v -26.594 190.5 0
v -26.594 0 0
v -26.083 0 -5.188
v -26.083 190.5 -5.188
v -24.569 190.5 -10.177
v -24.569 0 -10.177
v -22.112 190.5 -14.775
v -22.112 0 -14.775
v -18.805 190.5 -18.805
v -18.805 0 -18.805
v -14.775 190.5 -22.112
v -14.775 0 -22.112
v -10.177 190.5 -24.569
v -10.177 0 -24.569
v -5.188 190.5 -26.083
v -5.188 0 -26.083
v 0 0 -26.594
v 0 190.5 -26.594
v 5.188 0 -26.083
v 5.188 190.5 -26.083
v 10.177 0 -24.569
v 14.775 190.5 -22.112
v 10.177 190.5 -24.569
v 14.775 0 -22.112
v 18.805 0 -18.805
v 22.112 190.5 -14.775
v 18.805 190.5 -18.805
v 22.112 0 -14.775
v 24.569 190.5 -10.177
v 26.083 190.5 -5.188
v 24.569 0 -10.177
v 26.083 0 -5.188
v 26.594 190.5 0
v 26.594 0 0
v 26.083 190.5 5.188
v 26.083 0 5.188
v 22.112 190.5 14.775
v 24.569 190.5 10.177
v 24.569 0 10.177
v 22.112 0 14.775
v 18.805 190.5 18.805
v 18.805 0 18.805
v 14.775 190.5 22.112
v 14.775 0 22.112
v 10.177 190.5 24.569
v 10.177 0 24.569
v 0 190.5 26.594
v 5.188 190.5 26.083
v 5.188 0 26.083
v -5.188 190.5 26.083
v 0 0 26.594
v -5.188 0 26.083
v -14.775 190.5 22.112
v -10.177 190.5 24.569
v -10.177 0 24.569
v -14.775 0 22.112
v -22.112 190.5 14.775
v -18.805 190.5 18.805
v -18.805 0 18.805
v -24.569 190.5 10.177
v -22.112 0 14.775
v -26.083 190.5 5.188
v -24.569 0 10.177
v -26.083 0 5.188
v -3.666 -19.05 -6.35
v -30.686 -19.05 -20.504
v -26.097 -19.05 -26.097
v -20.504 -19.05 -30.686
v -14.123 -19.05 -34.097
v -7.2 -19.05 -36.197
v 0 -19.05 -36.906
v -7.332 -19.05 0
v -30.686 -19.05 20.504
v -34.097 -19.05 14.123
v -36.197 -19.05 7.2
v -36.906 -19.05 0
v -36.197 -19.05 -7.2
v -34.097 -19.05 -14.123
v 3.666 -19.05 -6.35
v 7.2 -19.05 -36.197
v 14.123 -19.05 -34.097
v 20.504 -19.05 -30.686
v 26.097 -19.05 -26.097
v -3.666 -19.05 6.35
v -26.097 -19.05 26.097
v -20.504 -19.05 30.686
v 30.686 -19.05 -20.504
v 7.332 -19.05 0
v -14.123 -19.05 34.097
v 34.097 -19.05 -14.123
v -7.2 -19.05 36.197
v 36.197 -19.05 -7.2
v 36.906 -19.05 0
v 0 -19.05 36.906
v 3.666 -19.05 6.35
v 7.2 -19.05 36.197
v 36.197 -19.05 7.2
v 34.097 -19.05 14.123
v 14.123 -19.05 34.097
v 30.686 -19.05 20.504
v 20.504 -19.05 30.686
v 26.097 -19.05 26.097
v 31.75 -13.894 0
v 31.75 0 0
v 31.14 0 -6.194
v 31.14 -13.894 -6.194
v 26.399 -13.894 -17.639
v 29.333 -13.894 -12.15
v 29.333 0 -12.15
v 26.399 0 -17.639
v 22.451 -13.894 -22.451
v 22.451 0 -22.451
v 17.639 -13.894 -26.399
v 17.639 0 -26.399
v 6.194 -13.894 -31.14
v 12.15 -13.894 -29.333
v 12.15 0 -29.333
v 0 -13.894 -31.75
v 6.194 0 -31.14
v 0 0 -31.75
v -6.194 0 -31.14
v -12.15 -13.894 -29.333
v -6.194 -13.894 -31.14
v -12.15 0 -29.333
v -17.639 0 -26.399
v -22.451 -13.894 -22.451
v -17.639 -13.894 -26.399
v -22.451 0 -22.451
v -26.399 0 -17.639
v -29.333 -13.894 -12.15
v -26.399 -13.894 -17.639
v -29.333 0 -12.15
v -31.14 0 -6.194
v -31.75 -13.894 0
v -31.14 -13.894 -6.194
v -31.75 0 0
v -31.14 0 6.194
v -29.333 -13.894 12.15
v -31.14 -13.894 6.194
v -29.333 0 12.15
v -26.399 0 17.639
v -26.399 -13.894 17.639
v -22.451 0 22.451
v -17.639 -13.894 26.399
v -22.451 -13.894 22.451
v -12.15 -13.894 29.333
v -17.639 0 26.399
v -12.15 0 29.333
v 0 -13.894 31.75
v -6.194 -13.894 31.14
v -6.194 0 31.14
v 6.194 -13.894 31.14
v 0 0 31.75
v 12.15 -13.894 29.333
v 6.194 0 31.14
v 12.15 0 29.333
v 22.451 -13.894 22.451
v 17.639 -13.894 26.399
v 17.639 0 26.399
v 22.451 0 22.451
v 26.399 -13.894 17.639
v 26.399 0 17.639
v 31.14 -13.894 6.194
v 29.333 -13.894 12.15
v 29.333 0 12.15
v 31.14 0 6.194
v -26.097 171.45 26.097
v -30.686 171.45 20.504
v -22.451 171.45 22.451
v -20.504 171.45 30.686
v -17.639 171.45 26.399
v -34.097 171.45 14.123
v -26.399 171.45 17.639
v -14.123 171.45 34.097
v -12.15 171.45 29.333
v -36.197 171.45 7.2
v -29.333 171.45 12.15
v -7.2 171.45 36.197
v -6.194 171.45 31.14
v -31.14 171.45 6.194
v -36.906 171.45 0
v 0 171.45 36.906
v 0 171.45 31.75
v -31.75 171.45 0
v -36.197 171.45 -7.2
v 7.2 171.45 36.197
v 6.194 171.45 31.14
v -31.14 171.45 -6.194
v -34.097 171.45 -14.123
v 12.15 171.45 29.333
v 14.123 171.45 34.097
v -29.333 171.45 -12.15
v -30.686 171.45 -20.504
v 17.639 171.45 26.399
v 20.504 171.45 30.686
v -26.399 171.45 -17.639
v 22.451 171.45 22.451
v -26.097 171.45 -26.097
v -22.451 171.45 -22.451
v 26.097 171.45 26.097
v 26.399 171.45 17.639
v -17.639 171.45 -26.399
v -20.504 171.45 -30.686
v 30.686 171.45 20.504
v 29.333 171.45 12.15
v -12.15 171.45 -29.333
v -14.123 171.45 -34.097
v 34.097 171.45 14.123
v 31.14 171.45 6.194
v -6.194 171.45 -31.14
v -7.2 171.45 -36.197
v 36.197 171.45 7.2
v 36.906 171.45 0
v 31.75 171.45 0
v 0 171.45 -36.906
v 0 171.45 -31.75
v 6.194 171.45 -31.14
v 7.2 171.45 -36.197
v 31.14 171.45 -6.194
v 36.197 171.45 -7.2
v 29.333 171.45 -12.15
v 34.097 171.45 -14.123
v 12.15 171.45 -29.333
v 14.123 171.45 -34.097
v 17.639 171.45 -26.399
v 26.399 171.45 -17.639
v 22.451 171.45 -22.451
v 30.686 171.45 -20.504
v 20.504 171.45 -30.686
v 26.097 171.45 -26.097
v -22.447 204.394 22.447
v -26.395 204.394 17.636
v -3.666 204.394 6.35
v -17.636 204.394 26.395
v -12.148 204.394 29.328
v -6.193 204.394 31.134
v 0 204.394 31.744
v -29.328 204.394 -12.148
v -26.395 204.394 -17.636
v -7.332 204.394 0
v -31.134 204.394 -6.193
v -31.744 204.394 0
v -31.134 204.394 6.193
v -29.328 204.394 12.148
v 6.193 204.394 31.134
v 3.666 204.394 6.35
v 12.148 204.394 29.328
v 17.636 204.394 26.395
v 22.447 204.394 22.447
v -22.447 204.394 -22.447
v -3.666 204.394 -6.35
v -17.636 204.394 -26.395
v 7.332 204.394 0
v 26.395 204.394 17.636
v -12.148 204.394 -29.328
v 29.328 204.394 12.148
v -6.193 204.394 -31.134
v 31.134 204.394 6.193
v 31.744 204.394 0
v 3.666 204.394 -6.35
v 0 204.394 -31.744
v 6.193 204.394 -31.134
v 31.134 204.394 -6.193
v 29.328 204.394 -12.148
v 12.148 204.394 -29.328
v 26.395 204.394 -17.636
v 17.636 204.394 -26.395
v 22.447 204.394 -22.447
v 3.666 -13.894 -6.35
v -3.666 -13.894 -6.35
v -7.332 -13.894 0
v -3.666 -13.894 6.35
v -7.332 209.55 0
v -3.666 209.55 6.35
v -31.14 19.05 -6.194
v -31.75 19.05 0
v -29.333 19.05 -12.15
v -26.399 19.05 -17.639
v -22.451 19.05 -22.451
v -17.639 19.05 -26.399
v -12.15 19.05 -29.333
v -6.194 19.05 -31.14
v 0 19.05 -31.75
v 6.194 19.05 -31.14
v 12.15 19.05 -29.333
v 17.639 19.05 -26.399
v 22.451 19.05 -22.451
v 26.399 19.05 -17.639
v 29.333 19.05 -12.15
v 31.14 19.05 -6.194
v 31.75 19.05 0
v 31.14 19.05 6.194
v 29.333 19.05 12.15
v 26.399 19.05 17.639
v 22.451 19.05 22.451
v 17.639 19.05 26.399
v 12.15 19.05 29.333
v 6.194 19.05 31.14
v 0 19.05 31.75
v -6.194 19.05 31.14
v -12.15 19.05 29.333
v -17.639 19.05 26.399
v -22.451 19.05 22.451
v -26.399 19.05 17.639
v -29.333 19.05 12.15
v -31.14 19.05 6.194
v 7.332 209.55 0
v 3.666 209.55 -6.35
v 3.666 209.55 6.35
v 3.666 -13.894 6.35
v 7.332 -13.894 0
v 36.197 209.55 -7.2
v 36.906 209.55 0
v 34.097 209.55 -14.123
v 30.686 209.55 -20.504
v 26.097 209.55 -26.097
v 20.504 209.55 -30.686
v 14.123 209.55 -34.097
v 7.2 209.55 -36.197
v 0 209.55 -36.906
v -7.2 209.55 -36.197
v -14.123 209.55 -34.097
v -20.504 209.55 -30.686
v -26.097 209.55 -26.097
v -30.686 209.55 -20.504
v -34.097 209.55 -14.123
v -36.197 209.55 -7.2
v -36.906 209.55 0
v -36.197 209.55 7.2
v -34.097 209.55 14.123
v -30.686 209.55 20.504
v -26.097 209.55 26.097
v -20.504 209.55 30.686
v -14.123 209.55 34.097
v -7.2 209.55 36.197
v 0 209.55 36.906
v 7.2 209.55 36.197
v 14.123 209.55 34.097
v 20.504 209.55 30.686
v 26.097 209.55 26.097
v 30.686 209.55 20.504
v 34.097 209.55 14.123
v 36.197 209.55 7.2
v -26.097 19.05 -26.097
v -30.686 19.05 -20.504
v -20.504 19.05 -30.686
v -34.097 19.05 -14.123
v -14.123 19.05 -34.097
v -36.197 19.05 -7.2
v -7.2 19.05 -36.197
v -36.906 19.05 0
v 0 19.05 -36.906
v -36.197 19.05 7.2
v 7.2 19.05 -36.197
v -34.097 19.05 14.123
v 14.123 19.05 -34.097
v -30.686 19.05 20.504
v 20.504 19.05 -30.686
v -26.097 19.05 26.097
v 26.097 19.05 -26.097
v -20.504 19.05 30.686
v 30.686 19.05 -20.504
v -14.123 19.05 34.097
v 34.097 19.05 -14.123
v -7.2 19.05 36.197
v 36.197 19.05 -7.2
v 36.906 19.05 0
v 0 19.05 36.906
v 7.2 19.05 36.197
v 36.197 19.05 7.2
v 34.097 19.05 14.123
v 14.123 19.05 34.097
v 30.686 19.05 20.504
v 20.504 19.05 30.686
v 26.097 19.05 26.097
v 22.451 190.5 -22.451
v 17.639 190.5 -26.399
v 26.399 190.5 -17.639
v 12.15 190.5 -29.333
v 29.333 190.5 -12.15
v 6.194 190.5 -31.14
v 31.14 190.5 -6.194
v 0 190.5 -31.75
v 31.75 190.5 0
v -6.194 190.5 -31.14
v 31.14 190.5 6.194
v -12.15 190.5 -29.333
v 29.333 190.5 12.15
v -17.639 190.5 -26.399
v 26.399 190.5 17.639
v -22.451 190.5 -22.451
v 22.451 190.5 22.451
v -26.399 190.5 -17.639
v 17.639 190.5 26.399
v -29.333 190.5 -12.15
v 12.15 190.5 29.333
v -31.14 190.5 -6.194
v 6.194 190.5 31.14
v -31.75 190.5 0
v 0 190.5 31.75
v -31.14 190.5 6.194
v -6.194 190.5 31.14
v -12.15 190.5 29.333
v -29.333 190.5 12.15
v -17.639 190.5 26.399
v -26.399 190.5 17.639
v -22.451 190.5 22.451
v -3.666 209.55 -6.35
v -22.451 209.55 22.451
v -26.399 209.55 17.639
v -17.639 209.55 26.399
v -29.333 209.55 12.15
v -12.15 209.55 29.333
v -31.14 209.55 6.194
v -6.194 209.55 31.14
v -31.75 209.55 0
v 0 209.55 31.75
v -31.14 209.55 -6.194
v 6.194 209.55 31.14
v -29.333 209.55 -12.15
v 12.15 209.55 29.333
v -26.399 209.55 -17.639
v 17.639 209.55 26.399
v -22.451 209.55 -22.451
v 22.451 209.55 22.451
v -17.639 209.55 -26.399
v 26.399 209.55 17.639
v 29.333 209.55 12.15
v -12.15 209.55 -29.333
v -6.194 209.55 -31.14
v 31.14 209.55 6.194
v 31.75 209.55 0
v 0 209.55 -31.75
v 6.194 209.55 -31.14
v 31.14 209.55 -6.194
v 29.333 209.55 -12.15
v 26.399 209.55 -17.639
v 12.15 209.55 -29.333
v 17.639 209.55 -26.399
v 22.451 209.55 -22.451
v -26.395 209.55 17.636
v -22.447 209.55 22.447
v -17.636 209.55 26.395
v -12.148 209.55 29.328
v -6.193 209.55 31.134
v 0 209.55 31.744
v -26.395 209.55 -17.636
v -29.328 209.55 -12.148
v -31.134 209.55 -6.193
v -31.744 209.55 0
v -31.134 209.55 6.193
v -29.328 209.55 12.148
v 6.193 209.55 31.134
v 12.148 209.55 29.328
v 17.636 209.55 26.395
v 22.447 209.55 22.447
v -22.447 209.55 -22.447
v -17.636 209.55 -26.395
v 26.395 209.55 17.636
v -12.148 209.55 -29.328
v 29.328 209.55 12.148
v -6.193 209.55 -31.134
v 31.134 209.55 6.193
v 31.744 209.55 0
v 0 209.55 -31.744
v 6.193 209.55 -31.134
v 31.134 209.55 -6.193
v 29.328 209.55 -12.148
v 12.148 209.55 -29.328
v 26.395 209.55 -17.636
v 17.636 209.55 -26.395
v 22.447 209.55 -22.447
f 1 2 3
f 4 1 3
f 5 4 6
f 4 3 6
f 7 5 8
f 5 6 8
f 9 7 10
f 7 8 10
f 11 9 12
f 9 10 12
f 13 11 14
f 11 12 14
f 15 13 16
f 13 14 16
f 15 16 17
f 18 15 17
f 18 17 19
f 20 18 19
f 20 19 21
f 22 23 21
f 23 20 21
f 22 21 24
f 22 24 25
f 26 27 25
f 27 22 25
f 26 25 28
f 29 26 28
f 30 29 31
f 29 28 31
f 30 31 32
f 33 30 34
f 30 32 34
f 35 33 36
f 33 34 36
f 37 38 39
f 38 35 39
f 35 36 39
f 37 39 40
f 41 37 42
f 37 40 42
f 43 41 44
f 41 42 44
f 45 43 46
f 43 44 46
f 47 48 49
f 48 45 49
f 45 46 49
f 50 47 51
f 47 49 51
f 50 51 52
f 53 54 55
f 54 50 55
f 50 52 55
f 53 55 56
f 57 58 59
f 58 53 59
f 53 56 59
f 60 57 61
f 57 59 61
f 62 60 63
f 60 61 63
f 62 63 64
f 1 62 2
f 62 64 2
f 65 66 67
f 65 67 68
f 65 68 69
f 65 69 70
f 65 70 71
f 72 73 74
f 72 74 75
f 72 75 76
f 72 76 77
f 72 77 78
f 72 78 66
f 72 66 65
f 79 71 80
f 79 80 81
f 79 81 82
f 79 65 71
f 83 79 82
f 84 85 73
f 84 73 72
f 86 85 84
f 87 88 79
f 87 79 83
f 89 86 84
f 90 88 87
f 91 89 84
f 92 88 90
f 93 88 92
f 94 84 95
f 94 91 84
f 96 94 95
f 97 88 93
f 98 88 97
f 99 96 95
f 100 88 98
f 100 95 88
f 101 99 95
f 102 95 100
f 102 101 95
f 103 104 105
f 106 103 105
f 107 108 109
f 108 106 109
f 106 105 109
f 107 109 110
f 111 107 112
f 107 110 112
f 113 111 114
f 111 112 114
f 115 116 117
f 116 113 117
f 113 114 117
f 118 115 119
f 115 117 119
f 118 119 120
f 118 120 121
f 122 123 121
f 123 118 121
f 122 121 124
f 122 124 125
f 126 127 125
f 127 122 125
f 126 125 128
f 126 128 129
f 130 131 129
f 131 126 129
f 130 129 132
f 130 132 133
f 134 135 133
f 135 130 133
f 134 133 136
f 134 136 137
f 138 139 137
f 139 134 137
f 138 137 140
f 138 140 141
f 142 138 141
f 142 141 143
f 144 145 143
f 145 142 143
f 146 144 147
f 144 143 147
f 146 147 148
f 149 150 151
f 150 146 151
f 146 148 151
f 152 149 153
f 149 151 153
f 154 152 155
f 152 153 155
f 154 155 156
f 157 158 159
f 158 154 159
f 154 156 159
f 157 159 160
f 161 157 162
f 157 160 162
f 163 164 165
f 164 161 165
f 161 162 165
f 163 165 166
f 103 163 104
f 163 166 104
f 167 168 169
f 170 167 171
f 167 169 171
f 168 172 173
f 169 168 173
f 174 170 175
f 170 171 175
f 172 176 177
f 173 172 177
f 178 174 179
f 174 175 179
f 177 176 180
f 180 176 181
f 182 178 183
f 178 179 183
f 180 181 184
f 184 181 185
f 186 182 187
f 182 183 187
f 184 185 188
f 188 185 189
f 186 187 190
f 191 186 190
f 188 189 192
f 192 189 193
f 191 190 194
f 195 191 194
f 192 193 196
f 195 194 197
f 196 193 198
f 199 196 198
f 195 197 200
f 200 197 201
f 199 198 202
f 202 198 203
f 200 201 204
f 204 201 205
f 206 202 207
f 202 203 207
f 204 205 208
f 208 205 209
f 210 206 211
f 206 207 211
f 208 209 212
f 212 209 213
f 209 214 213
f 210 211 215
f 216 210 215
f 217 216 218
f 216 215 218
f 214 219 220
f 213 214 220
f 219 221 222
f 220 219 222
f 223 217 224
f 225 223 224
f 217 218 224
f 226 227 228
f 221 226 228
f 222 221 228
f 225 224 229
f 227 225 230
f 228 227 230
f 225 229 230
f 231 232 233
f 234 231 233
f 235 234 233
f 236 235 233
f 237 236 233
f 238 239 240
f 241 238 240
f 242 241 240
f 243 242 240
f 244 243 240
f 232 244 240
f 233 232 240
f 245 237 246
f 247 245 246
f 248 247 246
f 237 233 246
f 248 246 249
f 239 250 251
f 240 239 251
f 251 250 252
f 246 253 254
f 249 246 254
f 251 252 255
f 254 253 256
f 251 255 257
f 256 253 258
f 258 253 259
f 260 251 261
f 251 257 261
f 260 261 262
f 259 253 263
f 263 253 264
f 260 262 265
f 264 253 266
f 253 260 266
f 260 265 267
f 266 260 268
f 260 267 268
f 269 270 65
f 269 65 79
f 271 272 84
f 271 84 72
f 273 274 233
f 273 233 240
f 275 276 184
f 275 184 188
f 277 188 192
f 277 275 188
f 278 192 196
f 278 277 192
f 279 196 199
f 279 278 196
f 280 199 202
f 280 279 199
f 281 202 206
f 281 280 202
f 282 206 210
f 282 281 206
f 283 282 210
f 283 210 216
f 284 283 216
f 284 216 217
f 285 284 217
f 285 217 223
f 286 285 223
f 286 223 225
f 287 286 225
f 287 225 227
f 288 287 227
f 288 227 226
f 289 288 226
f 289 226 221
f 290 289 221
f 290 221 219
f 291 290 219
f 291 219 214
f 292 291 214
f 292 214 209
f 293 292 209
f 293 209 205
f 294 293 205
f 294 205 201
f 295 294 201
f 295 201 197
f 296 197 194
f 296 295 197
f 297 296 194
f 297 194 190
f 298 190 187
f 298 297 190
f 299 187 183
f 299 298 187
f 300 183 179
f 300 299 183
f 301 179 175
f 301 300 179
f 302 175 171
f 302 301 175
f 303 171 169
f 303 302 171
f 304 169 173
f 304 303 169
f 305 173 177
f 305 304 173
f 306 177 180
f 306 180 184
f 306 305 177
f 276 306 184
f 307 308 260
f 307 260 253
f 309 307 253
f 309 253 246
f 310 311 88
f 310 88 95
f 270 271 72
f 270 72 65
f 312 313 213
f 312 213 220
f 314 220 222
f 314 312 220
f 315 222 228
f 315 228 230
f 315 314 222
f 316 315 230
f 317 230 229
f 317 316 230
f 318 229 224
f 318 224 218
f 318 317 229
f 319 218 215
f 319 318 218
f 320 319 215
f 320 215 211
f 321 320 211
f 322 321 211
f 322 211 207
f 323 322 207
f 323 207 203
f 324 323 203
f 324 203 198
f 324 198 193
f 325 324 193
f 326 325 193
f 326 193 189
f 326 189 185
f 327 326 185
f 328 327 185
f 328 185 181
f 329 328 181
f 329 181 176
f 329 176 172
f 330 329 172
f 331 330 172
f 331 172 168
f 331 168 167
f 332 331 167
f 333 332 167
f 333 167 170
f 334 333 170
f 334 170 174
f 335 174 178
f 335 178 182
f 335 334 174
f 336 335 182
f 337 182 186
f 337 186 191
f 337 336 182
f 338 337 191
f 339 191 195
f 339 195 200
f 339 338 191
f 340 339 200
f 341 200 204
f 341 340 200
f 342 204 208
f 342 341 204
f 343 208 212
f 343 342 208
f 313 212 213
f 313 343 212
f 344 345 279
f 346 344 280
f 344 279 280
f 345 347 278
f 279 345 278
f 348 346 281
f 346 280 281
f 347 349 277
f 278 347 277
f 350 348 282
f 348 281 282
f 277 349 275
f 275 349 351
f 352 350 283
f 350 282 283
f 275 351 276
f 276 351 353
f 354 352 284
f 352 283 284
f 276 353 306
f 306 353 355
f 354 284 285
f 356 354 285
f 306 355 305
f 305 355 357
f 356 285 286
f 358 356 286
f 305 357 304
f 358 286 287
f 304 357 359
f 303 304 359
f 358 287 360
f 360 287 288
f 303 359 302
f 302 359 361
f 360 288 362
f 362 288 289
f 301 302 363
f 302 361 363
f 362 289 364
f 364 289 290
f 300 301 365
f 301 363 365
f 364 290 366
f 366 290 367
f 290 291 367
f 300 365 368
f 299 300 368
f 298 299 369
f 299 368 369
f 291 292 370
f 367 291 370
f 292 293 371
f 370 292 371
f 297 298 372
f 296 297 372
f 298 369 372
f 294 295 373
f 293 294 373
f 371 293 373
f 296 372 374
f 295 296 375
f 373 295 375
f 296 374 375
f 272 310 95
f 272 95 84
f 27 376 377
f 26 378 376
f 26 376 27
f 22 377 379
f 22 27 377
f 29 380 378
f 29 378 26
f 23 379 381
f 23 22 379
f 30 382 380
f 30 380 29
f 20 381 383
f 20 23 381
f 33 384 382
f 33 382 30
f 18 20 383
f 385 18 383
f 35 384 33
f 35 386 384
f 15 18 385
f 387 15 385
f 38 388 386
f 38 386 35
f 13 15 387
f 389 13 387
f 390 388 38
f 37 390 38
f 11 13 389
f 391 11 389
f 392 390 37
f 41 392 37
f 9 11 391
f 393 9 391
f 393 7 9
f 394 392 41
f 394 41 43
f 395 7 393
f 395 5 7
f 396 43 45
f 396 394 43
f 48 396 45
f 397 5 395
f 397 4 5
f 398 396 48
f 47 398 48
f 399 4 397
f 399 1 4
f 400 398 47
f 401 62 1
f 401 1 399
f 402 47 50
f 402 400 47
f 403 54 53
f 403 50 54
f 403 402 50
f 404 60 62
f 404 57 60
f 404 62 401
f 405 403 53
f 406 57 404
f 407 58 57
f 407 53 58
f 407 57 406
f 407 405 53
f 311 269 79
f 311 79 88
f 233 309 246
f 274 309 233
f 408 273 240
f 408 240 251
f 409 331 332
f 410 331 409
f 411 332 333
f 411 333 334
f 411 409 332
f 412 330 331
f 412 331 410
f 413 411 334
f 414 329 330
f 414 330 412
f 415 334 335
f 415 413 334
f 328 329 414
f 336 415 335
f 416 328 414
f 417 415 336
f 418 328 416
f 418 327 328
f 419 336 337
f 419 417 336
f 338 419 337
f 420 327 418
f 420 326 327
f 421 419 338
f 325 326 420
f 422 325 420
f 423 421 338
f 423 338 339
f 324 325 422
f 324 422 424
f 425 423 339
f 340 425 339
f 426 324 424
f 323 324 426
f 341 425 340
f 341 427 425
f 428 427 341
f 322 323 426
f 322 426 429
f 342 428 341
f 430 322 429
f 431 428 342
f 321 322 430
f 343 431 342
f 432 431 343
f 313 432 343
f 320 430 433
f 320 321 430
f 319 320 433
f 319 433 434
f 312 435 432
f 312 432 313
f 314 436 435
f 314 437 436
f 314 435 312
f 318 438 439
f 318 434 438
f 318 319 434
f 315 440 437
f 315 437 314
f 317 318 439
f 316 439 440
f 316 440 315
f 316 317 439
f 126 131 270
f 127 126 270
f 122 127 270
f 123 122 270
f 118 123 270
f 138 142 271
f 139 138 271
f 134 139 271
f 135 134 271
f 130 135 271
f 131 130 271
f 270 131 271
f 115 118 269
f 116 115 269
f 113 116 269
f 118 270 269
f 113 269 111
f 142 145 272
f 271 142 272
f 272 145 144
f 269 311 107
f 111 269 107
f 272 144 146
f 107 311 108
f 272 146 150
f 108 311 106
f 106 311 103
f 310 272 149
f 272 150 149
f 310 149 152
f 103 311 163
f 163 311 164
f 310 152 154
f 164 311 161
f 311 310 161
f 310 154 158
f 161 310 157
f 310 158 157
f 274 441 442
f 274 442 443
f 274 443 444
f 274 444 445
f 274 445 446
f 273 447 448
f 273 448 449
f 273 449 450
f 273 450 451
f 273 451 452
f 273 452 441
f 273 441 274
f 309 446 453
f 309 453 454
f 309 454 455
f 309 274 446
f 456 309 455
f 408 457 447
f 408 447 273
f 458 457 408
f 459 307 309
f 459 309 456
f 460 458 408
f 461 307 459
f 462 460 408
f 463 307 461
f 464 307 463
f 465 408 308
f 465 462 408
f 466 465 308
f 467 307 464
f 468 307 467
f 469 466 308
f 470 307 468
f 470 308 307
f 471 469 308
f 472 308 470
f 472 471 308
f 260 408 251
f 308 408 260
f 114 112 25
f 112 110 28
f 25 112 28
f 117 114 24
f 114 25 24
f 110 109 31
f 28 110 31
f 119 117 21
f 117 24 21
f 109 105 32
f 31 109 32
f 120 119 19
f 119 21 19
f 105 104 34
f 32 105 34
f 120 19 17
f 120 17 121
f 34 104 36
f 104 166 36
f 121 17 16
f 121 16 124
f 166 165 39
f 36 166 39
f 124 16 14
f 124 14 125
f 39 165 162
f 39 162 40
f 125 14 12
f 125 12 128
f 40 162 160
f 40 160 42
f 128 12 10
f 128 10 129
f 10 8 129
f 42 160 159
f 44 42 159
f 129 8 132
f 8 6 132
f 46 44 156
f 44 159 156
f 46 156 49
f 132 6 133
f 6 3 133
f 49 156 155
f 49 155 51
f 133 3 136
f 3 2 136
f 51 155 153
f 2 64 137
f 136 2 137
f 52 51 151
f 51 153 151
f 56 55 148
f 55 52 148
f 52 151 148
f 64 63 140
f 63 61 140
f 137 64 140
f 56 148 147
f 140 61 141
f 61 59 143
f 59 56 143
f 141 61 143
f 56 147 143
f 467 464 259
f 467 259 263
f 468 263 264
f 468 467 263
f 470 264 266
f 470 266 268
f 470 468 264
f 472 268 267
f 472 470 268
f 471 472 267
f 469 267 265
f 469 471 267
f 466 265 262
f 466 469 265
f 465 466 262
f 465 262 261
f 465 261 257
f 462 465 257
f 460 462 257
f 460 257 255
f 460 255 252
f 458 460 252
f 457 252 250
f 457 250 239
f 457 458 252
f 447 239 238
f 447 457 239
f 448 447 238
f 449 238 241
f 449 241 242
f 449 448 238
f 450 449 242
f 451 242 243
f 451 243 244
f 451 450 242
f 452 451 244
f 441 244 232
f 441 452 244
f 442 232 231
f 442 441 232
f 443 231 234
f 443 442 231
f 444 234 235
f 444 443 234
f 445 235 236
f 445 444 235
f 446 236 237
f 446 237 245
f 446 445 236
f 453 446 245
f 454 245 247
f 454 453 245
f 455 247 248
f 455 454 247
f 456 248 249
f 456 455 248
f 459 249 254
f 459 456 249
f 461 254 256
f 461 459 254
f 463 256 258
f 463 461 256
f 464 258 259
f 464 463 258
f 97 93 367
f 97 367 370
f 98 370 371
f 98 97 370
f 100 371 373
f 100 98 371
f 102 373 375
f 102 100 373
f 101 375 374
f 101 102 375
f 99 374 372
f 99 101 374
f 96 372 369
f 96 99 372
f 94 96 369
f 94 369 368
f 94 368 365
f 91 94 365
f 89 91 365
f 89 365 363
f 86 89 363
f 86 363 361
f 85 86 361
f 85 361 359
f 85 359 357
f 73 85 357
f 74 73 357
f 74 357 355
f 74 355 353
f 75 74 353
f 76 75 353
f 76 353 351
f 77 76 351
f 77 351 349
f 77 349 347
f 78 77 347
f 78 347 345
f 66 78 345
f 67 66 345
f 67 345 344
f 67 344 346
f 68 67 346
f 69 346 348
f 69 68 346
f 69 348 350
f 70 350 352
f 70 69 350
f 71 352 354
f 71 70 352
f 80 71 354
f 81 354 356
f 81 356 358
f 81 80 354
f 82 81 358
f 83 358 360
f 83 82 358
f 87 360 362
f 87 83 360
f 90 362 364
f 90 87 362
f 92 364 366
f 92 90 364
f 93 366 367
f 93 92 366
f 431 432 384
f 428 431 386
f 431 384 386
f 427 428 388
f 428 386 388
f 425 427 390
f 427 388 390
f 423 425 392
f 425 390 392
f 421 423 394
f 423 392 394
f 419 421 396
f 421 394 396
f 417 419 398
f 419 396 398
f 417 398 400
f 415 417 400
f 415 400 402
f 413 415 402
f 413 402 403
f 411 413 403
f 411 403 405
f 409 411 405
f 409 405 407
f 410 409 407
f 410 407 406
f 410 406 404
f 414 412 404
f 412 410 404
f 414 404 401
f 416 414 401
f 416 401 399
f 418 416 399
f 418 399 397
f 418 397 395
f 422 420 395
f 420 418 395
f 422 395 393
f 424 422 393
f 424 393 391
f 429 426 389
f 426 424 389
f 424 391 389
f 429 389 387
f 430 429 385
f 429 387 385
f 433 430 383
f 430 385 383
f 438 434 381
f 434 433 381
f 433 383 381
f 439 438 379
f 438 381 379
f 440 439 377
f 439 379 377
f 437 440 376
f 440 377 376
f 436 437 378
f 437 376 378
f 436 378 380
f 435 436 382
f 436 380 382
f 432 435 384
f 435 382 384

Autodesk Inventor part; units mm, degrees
ref_plane "YZ Plane" through (0, 0, 0) normal (1, 0, 0) x (0, 1, 0)
ref_plane "XZ Plane" through (0, 0, 0) normal (0, 1, 0) x (-1, 0, 0)
ref_plane "XY Plane" through (0, 0, 0) normal (0, 0, 1) x (1, 0, 0)
sketch "Sketch6" plane through (0, 0, 0) normal (0, 1, 0) x (-1, 0, 0)
  circle A0 centre (0, 0) radius 31.75
  circle A1 centre (0, 0) radius 26.5938
  dimension "d16" = 63.5
  dimension "d17" = 5.1562
extrude "Extrusion5" add sketch "Sketch6" along normal blind 190.5
sketch "Sketch7" plane through (0, 0, 0) normal (0, -1, 0) x (1, 0, 0)
  circle A0 centre (0, 0) radius 36.9062
  circle A1 centre (0, 0) radius 31.75
  dimension "d20" = 63.5
  dimension "d21" = 5.1562
extrude "Extrusion6" add sketch "Sketch7" along normal mid plane 38.1
sketch "Sketch8" plane through (0, -19.05, 0) normal (0, -1, 0) x (1, 0, 0)
  circle A0 centre (0, 0) radius 31.75
extrude "Extrusion7" add sketch "Sketch8" against normal blind 5.1562
sketch "Sketch9" plane through (0, 190.5, 0) normal (0, 1, 0) x (1, 0, 0)
  circle A0 centre (0, 0) radius 31.75
  circle A1 centre (0, 0) radius 36.9062
extrude "Extrusion8" add sketch "Sketch9" along normal mid plane 38.1
sketch "Sketch10" plane through (0, 209.55, 0) normal (0, 1, 0) x (1, 0, 0)
  circle A0 centre (0, 0) radius 31.7444
  dimension "d28" = 63.4887
extrude "Extrusion9" add sketch "Sketch10" against normal blind 5.1562
sketch "Sketch11" plane through (0, 209.55, 0) normal (0, 1, 0) x (1, 0, 0)
  line L0 (-7.3323, 0) -> (-3.6662, 6.35)
  line L1 (-3.6662, 6.35) -> (3.6662, 6.35)
  line L2 (3.6662, 6.35) -> (7.3323, 0)
  line L3 (7.3323, 0) -> (3.6662, -6.35)
  line L4 (3.6662, -6.35) -> (-3.6662, -6.35)
  line L5 (-3.6662, -6.35) -> (-7.3323, 0)
  point P0 (0, 0)
  point P1 (0, 0)
  dimension "d31" = 12.7
extrude "Extrusion10" cut sketch "Sketch11" against normal blind 228.6
properties part number "Roller Drum 10-Inch" material "PVC-Piping"
